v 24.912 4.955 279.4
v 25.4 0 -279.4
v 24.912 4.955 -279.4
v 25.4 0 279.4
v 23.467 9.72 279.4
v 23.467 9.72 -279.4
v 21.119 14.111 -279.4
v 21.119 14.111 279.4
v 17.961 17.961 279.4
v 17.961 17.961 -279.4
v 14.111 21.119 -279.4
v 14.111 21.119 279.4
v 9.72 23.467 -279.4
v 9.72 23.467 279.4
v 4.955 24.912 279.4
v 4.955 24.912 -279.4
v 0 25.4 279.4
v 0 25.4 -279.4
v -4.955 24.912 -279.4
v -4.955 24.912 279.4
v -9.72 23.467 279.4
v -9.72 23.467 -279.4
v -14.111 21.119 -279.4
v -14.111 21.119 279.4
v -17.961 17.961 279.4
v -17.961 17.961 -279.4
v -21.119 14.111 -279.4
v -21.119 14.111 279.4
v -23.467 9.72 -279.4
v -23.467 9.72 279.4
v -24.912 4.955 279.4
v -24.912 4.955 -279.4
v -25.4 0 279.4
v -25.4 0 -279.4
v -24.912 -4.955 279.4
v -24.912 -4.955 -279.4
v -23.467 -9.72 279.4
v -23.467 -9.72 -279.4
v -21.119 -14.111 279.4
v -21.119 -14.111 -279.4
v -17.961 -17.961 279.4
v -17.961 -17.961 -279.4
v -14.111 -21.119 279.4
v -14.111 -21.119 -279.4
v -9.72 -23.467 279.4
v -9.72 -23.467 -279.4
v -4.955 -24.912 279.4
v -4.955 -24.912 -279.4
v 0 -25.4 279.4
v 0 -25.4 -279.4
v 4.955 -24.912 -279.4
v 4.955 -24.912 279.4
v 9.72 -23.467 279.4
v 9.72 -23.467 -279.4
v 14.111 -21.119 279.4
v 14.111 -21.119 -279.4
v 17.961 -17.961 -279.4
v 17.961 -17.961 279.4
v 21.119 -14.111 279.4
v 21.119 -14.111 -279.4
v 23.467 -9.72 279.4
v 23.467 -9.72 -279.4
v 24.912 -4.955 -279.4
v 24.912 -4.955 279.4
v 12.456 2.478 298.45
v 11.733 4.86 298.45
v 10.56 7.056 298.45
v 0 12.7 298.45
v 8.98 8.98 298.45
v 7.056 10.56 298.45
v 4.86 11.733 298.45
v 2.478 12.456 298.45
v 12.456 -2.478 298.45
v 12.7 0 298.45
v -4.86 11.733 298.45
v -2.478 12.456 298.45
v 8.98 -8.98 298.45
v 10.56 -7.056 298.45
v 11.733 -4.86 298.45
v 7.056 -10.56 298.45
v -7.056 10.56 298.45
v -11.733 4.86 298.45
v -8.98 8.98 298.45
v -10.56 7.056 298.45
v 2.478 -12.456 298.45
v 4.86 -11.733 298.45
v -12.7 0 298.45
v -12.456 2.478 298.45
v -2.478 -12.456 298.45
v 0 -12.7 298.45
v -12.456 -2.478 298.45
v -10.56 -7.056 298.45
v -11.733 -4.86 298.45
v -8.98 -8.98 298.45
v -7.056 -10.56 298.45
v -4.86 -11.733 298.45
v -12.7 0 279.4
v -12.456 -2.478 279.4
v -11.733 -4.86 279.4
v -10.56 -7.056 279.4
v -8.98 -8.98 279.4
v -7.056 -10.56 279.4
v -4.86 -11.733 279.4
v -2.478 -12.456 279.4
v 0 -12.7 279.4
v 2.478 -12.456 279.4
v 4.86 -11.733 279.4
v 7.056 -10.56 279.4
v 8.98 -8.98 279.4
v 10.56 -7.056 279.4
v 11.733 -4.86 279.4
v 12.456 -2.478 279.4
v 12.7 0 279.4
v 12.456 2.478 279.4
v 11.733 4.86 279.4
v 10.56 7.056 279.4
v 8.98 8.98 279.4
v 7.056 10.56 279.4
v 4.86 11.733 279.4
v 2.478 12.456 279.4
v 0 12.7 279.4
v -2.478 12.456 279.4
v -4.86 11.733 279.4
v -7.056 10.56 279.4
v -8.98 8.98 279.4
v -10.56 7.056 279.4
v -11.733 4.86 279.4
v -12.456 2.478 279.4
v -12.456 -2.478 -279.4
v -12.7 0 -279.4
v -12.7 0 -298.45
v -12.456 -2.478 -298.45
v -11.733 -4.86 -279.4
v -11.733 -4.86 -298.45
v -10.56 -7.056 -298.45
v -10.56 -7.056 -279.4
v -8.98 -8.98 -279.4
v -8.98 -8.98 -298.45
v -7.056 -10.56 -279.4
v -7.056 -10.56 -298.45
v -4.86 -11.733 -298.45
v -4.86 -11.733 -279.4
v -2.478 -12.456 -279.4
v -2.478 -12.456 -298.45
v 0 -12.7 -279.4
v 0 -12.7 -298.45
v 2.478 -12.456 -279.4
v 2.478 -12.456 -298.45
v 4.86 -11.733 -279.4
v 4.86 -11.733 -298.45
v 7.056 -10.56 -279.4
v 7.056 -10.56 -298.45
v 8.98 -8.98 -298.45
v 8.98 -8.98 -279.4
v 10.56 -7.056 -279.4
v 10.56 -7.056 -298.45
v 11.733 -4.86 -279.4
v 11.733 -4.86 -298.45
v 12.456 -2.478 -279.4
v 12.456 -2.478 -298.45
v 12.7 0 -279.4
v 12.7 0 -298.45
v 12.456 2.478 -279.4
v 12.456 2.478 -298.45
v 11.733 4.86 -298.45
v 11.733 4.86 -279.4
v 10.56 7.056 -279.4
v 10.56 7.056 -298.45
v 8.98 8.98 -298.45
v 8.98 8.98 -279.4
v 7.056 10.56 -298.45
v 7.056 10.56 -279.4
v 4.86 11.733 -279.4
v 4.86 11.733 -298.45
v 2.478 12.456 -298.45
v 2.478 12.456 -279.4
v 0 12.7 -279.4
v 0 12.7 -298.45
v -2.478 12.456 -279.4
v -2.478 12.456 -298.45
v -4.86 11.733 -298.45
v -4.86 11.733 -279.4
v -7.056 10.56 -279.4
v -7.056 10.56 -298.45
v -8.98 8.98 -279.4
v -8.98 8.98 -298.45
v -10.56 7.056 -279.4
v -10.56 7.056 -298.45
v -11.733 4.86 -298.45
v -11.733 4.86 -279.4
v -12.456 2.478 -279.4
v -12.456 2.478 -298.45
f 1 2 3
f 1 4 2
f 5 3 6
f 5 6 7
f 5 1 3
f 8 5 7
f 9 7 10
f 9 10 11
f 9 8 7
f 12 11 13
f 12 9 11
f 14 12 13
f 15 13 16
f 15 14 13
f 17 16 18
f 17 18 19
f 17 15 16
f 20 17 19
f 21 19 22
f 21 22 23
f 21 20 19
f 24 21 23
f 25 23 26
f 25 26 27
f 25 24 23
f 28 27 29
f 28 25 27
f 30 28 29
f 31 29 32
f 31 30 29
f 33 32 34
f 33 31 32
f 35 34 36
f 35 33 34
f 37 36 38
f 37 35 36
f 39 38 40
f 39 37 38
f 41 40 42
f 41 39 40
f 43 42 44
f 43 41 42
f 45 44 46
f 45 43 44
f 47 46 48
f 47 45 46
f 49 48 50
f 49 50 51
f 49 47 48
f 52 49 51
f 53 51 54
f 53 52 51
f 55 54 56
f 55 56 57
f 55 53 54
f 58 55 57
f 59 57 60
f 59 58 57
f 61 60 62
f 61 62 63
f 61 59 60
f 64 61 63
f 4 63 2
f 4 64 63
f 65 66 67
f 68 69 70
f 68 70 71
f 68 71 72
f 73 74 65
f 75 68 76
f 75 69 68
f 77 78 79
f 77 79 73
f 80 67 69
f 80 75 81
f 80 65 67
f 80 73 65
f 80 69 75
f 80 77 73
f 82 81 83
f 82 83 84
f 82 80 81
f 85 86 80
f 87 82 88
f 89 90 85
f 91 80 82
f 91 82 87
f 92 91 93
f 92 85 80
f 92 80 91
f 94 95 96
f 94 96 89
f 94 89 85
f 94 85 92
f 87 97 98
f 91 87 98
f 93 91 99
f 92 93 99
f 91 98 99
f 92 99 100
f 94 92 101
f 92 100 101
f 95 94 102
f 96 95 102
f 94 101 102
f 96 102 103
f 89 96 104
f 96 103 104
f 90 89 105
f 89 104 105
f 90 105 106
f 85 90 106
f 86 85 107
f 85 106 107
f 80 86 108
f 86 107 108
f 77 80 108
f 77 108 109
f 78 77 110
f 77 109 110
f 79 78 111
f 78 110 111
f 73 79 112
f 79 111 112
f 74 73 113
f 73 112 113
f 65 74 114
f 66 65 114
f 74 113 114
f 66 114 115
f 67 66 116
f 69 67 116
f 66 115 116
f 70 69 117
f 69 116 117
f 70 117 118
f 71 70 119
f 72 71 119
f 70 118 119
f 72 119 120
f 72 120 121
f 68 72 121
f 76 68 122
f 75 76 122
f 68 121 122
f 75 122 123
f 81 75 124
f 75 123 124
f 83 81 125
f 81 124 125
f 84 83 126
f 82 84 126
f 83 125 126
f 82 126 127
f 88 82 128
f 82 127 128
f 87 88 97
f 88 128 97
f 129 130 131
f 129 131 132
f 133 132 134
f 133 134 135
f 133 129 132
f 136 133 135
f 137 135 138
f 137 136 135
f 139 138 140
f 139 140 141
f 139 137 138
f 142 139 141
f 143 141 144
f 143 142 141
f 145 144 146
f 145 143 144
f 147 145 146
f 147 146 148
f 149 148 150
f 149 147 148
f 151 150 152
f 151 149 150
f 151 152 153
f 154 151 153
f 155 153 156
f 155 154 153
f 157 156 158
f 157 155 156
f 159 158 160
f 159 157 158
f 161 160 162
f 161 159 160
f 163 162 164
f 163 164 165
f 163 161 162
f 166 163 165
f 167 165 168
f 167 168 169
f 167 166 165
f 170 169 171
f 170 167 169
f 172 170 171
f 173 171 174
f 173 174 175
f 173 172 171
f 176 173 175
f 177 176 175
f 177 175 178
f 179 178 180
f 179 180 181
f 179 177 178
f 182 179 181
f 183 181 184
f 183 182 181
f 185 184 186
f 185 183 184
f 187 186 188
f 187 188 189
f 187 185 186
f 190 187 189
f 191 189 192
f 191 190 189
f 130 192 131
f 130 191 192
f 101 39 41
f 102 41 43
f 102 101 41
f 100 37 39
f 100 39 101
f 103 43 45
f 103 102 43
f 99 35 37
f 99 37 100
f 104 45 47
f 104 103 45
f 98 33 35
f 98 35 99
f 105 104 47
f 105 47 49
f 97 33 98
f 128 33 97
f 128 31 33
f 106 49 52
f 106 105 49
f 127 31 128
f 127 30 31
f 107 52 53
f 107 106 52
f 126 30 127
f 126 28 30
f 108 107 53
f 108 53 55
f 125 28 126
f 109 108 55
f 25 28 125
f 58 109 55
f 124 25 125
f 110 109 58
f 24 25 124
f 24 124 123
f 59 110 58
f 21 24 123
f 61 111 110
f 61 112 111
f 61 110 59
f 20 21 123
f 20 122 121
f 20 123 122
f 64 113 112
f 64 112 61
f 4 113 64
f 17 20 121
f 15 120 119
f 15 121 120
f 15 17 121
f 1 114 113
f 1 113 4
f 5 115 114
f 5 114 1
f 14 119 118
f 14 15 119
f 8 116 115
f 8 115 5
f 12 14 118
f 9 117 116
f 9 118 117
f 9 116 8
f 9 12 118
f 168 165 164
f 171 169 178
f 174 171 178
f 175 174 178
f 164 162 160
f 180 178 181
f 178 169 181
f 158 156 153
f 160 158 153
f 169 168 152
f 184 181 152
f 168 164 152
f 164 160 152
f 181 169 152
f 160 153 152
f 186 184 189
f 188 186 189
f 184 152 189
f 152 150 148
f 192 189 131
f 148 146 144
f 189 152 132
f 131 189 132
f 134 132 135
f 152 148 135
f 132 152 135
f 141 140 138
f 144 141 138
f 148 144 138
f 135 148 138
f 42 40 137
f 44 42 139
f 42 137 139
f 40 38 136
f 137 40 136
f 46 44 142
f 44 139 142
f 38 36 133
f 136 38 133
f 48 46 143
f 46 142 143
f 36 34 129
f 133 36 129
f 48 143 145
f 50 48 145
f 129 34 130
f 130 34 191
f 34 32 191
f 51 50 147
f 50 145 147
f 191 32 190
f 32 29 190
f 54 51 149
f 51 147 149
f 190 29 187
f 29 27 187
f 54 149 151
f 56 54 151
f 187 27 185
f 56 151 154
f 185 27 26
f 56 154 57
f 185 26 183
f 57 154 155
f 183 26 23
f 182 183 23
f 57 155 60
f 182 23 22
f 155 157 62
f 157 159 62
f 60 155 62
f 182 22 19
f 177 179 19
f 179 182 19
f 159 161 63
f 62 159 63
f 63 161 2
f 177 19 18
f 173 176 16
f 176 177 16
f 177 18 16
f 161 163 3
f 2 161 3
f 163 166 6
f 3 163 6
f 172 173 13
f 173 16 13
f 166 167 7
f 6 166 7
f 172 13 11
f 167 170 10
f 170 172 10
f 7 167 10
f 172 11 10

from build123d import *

# Parameters (mm, degrees)
SKETCH1_R           = 25.4
BASE_EXTRUDE_DEPTH  = 279.4
SKETCH2_R           = 12.7
BOSS_EXTRUDE1_DEPTH = 19.05


with BuildPart() as part:
    # Sketch1 → Base-Extrude (new, symmetric)
    with BuildSketch(Plane.XY):
        Circle(SKETCH1_R)
    extrude(amount=BASE_EXTRUDE_DEPTH, both=True)

    # Sketch2 → Boss-Extrude1 (add)
    with BuildSketch(Plane.XY.offset(279.4)):
        with Locations(Location((0, 0, 0), (0, 0, 180))):
            Circle(SKETCH2_R)
    boss_extrude1 = extrude(amount=BOSS_EXTRUDE1_DEPTH)

    # Mirror1: Boss-Extrude1 across plane
    add(boss_extrude1.mirror(Plane.XY))


solid = part.part
